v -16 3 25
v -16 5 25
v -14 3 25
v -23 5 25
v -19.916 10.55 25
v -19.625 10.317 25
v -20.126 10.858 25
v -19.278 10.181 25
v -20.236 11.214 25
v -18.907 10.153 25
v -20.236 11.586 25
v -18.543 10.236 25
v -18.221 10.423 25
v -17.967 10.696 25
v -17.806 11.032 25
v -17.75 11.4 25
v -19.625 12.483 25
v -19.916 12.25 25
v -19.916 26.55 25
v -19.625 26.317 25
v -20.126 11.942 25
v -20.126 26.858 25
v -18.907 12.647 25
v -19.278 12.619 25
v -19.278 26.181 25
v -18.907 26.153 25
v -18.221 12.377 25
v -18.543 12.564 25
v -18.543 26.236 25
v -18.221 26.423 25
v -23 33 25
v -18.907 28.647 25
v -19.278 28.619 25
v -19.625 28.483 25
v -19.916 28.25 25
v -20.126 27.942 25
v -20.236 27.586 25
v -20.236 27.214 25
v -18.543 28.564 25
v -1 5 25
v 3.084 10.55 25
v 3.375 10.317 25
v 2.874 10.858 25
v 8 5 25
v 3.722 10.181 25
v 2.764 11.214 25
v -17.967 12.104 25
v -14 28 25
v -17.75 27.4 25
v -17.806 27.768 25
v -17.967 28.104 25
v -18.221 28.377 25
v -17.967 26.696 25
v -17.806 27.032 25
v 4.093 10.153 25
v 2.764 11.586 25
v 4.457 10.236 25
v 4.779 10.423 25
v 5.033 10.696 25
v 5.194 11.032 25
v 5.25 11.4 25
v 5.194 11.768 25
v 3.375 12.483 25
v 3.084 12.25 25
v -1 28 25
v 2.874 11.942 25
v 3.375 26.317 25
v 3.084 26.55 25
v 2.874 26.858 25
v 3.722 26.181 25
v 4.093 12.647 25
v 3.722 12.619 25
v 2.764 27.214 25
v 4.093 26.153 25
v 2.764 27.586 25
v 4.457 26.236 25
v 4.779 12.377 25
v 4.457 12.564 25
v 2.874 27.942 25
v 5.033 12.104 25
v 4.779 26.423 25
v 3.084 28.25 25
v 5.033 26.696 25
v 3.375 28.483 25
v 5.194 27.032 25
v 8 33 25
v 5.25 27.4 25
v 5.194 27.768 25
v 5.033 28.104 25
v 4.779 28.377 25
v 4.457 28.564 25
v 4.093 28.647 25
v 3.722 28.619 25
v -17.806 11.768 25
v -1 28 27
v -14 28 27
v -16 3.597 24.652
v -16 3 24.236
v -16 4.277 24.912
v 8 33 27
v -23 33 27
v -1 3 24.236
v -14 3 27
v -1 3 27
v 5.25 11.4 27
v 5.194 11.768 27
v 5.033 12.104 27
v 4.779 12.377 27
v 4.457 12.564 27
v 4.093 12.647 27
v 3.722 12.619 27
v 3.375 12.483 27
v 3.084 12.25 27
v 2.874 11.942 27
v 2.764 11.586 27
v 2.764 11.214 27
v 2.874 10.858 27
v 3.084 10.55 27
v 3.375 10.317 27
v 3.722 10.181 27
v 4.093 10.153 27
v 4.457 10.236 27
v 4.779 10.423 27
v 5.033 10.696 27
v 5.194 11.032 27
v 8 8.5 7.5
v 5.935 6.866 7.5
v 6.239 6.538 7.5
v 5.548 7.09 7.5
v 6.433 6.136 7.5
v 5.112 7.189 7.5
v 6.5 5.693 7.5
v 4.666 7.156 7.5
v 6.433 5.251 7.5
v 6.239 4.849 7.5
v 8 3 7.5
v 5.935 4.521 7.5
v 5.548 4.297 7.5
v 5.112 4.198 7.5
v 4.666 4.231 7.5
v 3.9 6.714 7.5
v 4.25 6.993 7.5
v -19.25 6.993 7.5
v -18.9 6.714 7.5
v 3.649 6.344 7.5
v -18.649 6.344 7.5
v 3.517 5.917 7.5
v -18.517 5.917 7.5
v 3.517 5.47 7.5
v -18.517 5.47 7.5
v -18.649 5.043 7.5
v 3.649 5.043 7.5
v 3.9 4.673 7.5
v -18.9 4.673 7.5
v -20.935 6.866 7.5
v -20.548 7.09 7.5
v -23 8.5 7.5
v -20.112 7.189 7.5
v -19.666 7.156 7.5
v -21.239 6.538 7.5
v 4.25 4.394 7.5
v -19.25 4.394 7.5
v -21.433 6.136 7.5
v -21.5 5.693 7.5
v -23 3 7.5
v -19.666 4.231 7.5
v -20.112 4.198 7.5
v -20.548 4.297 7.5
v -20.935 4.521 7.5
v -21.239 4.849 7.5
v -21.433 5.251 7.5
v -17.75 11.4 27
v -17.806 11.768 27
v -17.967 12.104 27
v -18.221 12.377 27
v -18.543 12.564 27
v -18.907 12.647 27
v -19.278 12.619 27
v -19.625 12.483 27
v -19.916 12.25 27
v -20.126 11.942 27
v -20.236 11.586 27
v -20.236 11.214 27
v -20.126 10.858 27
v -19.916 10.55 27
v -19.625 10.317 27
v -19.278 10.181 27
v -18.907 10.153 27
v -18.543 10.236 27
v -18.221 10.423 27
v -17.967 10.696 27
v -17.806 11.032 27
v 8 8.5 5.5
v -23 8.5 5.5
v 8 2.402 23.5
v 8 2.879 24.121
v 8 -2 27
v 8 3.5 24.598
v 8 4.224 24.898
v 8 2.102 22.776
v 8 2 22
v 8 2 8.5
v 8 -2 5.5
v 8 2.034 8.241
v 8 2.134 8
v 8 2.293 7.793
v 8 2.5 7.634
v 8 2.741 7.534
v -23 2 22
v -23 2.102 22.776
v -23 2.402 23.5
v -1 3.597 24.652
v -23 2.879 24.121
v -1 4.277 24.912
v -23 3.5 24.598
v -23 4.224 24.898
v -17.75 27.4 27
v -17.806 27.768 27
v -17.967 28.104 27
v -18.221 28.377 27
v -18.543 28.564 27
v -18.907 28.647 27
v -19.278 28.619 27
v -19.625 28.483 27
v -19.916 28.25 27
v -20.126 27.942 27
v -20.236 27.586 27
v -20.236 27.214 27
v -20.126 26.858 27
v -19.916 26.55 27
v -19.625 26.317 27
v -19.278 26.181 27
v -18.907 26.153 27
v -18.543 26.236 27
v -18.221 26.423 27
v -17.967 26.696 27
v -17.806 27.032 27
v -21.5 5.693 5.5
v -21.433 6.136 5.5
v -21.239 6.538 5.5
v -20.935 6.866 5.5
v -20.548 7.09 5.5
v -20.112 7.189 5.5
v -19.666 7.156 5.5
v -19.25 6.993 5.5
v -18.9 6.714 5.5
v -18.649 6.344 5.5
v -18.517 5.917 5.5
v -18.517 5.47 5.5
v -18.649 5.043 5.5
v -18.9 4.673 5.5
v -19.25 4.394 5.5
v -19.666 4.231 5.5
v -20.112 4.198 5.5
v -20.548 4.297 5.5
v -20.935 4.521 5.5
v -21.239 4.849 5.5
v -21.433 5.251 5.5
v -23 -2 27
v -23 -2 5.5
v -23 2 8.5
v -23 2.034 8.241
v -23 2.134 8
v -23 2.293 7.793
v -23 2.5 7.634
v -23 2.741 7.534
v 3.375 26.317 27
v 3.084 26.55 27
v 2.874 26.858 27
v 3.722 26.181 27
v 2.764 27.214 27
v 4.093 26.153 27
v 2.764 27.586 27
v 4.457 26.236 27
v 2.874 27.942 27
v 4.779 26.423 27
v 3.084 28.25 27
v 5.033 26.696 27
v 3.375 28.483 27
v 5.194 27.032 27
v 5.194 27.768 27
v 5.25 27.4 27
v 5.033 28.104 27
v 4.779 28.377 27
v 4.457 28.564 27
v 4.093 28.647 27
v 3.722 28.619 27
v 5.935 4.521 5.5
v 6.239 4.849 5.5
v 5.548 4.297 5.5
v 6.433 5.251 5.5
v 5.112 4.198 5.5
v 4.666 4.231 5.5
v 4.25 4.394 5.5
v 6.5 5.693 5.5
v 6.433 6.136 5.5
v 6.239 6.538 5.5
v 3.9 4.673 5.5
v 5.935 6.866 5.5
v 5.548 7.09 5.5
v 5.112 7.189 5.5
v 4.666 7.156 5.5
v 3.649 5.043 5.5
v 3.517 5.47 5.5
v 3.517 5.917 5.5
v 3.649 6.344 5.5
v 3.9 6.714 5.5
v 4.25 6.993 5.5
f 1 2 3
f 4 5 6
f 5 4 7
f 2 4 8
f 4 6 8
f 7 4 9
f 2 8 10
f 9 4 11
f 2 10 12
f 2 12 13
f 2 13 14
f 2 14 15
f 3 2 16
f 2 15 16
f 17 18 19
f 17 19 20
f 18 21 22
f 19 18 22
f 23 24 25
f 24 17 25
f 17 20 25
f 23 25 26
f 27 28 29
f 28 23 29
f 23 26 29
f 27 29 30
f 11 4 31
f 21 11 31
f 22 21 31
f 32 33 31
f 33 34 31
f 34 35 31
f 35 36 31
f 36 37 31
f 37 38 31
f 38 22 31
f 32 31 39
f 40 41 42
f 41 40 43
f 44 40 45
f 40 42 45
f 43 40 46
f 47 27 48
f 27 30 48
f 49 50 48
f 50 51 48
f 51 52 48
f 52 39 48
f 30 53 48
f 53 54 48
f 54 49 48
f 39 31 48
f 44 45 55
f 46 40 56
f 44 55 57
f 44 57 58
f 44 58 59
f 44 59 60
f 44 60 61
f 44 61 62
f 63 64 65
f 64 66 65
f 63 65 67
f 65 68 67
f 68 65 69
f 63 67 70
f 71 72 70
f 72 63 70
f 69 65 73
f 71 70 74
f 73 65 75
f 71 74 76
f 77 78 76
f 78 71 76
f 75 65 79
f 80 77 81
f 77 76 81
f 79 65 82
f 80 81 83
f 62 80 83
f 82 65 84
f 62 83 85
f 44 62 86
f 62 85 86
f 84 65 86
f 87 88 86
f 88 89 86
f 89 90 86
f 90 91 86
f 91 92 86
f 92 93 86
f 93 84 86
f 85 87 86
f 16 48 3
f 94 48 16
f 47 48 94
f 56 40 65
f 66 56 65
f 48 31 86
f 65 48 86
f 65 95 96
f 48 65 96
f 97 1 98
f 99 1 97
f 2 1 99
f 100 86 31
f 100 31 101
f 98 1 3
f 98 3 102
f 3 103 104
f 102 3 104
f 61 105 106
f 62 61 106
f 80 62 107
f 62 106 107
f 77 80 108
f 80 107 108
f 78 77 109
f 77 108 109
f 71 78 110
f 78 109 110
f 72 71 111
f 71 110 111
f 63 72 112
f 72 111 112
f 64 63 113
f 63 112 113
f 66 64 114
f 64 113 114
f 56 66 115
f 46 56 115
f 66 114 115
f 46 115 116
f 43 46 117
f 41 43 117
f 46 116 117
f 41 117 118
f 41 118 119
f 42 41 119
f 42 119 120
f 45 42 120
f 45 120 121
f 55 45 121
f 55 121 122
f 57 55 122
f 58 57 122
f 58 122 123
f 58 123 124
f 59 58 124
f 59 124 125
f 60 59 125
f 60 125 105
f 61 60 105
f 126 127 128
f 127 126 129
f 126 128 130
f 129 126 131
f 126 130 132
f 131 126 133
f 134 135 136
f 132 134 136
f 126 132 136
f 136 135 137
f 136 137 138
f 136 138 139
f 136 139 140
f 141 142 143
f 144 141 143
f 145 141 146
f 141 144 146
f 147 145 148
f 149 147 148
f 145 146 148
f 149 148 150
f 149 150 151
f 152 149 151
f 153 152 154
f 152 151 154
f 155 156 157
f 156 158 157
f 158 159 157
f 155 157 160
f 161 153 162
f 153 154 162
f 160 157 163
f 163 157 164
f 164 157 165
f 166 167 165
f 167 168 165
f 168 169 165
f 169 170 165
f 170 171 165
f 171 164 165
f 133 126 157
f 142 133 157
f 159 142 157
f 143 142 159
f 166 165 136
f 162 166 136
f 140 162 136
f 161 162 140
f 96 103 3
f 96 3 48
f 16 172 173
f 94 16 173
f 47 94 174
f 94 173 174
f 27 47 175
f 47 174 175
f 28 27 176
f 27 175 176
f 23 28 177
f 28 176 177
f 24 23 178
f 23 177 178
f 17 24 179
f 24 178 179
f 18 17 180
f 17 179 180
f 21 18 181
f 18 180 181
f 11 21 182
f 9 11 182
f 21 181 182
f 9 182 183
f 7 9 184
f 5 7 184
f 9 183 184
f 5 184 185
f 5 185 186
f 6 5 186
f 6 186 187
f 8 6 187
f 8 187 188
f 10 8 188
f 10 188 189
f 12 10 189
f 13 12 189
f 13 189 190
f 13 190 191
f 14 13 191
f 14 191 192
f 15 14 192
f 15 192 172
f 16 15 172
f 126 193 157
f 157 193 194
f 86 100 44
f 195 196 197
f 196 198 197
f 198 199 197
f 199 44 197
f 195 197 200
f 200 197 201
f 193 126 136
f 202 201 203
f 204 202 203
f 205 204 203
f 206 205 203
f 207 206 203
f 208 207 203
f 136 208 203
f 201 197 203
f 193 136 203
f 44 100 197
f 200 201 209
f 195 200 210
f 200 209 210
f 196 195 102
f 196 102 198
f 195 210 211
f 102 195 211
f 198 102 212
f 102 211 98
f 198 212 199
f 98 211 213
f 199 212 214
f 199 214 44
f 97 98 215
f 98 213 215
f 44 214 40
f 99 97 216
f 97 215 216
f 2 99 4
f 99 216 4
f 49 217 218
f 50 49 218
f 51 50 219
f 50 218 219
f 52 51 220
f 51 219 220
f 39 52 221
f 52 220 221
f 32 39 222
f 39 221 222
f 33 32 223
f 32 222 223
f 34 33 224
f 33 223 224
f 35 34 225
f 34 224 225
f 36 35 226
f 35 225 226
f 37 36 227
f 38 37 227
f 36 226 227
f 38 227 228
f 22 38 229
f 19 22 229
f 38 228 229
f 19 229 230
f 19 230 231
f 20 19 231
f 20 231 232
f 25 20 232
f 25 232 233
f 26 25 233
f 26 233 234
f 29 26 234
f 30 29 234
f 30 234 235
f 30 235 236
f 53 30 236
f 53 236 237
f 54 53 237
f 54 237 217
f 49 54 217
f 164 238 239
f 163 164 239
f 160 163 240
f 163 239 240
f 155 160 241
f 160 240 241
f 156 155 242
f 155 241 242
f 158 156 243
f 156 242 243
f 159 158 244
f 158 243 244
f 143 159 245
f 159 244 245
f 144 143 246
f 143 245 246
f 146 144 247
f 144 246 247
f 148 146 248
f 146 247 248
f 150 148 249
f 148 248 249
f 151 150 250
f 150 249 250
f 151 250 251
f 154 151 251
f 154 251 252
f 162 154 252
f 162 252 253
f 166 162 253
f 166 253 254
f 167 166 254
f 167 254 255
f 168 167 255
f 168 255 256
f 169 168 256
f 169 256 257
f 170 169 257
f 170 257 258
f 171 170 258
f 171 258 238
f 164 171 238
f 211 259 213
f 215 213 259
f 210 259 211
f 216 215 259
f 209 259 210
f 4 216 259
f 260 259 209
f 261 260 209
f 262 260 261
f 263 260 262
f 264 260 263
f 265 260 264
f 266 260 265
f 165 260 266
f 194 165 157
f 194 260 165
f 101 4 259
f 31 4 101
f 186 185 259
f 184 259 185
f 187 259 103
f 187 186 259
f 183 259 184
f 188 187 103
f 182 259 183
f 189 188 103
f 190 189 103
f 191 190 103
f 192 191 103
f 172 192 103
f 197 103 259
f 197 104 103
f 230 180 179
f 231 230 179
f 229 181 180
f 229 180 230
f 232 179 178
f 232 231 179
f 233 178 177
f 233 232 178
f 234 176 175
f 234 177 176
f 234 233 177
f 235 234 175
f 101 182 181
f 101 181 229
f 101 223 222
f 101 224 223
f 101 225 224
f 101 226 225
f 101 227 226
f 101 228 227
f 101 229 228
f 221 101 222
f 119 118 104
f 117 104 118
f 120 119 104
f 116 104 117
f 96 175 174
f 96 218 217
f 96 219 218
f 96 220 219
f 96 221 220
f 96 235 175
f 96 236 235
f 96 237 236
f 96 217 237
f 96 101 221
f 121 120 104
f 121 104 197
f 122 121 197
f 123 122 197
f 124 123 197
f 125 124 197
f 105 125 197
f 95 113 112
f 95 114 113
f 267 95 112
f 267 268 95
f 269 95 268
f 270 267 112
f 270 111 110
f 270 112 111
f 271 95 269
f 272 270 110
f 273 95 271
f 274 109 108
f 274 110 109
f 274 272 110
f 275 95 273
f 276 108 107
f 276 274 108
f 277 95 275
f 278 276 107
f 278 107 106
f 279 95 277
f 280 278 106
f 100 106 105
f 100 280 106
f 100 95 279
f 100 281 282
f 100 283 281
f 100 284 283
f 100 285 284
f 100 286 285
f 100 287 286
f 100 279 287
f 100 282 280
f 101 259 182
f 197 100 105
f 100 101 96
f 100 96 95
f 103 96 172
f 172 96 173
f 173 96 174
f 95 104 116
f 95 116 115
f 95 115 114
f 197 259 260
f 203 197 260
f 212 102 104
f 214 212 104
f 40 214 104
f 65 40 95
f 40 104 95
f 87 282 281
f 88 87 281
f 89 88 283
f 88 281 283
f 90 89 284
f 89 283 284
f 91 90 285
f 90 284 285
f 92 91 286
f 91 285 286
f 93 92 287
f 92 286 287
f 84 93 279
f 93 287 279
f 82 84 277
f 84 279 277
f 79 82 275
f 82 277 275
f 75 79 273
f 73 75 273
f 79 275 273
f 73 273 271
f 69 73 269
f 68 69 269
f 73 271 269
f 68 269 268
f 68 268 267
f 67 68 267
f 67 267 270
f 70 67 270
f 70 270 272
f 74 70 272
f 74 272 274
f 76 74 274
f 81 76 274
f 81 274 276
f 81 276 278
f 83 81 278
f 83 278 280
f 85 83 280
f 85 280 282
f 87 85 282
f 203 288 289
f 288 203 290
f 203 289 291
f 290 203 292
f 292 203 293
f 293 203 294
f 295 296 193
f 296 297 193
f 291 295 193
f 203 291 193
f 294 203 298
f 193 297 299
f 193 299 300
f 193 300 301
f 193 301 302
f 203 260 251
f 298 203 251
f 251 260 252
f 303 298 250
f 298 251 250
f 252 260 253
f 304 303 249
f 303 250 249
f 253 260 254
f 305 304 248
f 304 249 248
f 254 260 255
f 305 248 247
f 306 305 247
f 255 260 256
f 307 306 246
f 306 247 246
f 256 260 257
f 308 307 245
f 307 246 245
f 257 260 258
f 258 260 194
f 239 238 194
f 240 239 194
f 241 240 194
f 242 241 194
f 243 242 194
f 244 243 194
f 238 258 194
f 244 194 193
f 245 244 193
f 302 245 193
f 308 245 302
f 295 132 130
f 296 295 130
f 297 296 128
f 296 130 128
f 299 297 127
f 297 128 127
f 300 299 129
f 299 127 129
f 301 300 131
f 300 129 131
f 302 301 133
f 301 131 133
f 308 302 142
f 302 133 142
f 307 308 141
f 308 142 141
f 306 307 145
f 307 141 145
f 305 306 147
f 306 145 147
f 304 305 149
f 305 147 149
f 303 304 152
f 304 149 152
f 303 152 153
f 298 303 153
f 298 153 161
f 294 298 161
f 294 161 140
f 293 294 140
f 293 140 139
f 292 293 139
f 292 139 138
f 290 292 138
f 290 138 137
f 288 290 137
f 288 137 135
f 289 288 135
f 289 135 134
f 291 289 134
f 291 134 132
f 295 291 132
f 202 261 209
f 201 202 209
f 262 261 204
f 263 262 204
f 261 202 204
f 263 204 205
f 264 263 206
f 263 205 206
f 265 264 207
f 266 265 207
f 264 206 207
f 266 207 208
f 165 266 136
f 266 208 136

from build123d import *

# Parameters (mm, degrees)
SKETCH1_W           = 16
SKETCH1_H           = 4
BOSS_EXTRUDE1_DEPTH = 25
SKETCH2_W           = 16
SKETCH2_H           = 35
BOSS_EXTRUDE2_DEPTH = 2
FILLET1_R           = 3
SKETCH9_W           = 16
SKETCH9_H           = 5.5
CUT_EXTRUDE6_DEPTH  = 10
SKETCH10_W          = 16
SKETCH10_H          = 2
BOSS_EXTRUDE4_DEPTH = 8
SKETCH12_R          = 1.5
CUT_EXTRUDE7_DEPTH  = 10
SKETCH13_R          = 1
CUT_EXTRUDE8_DEPTH  = 10
BOSS_EXTRUDE5_START = 17
BOSS_EXTRUDE5_DEPTH = 17
SKETCH15_W          = 33
SKETCH15_H          = 1.5
CUT_EXTRUDE9_DEPTH  = 10
SKETCH17_W          = 7.5
SKETCH17_H          = 25
CUT_EXTRUDE11_DEPTH = 10
SKETCH18_R          = 1.1
CUT_EXTRUDE12_DEPTH = 27
SKETCH19_W          = 2
SKETCH19_H          = 35
CUT_EXTRUDE13_DEPTH = 27
SKETCH21_W          = 2
SKETCH21_H          = 25
BOSS_EXTRUDE6_DEPTH = 2
SKETCH22_R          = 1.5
CUT_EXTRUDE14_DEPTH = 11
FILLET2_R           = 1
SKETCH23_R          = 1.25
CUT_EXTRUDE15_DEPTH = 10


with BuildPart() as part:
    # Sketch1 → Boss-Extrude1 (new body)
    with BuildSketch(Plane.XY):
        Rectangle(SKETCH1_W, SKETCH1_H)
    extrude(amount=BOSS_EXTRUDE1_DEPTH)

    # Sketch2 → Boss-Extrude2 (add)
    with BuildSketch(Plane.XY.offset(25)):
        with Locations((0, 15.5)):
            Rectangle(SKETCH2_W, SKETCH2_H)
    extrude(amount=BOSS_EXTRUDE2_DEPTH)

    # Fillet1
    fillet1_edges = [part.edges().sort_by_distance(p)[0] for p in [
        (0, 2, 25),
    ]]
    fillet(fillet1_edges, radius=FILLET1_R)

    # Sketch9 → Cut-Extrude6 (cut)
    with BuildSketch(Plane(origin=(0, 2, 0), x_dir=(1, 0, 0), z_dir=(0, 1, 0))):
        with Locations((0, -2.75)):
            Rectangle(SKETCH9_W, SKETCH9_H)
    extrude(amount=-CUT_EXTRUDE6_DEPTH, mode=Mode.SUBTRACT)

    # Sketch10 → Boss-Extrude4 (add)
    with BuildSketch(Plane(origin=(0, 2, 0), x_dir=(1, 0, 0), z_dir=(0, 1, 0))):
        with Locations((0, -6.5)):
            Rectangle(SKETCH10_W, SKETCH10_H)
    extrude(amount=BOSS_EXTRUDE4_DEPTH)

    # Sketch12 → Cut-Extrude7 (cut)
    with BuildSketch(Plane.XY.offset(7.5)):
        with Locations((5, 5.69348198)):
            Circle(SKETCH12_R)
    extrude(amount=-CUT_EXTRUDE7_DEPTH, mode=Mode.SUBTRACT)

    # Sketch13 → Cut-Extrude8 (cut)
    with BuildSketch(Plane.XY.offset(27)):
        with Locations((4, 27.4)):
            Circle(SKETCH13_R)
        with Locations((4, 11.4)):
            Circle(SKETCH13_R)
    extrude(amount=-CUT_EXTRUDE8_DEPTH, mode=Mode.SUBTRACT)

    # Sketch14 → Boss-Extrude5 (add)
    with BuildSketch(Plane.ZY.offset(8).offset(BOSS_EXTRUDE5_START)):
        with BuildLine():
            Line((5.5, 10), (7.5, 10))
            Line((7.5, 10), (7.5, 2))
            Line((7.5, 2), (22, 2))
            ThreePointArc((22, 2), (24.121320344, 2.878679656), (25, 5))
            Line((25, 5), (25, 33))
            Line((25, 33), (27, 33))
            Line((27, 33), (27, -2))
            Line((27, -2), (5.5, -2))
            Line((5.5, -2), (5.5, 10))
        make_face()
    extrude(amount=-BOSS_EXTRUDE5_DEPTH)

    # Sketch15 → Cut-Extrude9 (cut)
    with BuildSketch(Plane(origin=(0, 0, 5.5), x_dir=(-1, 0, 0), z_dir=(0, 0, -1))):
        with Locations((8.5, 9.25)):
            Rectangle(SKETCH15_W, SKETCH15_H)
    extrude(amount=-CUT_EXTRUDE9_DEPTH, mode=Mode.SUBTRACT)

    # Sketch17 → Cut-Extrude11 (cut)
    with BuildSketch(Plane.XY.offset(27)):
        with Locations((-12.25, 15.5)):
            Rectangle(SKETCH17_W, SKETCH17_H)
        with Locations((-4.75, 15.5)):
            Rectangle(SKETCH17_W, SKETCH17_H)
    extrude(amount=-CUT_EXTRUDE11_DEPTH, mode=Mode.SUBTRACT)

    # Sketch18 → Cut-Extrude12 (cut)
    with BuildSketch(Plane(origin=(0, 0, 25), x_dir=(-1, 0, 0), z_dir=(0, 0, -1))):
        with Locations((19, 11.4)):
            Circle(SKETCH18_R)
        with Locations((19, 27.4)):
            Circle(SKETCH18_R)
        with Locations((-4, 27.4)):
            Circle(SKETCH18_R)
        with Locations((-4, 11.4)):
            Circle(SKETCH18_R)
    extrude(amount=-CUT_EXTRUDE12_DEPTH, mode=Mode.SUBTRACT)

    # Sketch19 → Cut-Extrude13 (cut)
    with BuildSketch(Plane(origin=(0, 0, 5.5), x_dir=(-1, 0, 0), z_dir=(0, 0, -1))):
        with Locations((24, 15.5)):
            Rectangle(SKETCH19_W, SKETCH19_H)
    extrude(amount=-CUT_EXTRUDE13_DEPTH, mode=Mode.SUBTRACT)

    # Sketch21 → Boss-Extrude6 (add)
    with BuildSketch(Plane.XY.offset(27)):
        with Locations((-15, 15.5)):
            Rectangle(SKETCH21_W, SKETCH21_H)
    extrude(amount=-BOSS_EXTRUDE6_DEPTH)

    # Sketch22 → Cut-Extrude14 (cut)
    with BuildSketch(Plane(origin=(0, 0, 5.5), x_dir=(-1, 0, 0), z_dir=(0, 0, -1))):
        with Locations((20, 5.69348198)):
            Circle(SKETCH22_R)
    extrude(amount=-CUT_EXTRUDE14_DEPTH, mode=Mode.SUBTRACT)

    # Fillet2
    fillet2_edges = [part.edges().sort_by_distance(p)[0] for p in [
        (-7.5, 2, 7.5),
    ]]
    fillet(fillet2_edges, radius=FILLET2_R)

    # Sketch23 → Cut-Extrude15 (cut)
    with BuildSketch(Plane.XY.offset(27)):
        with Locations((4, 27.4)):
            Circle(SKETCH23_R)
        with Locations((4, 11.4)):
            Circle(SKETCH23_R)
        with Locations((-19, 11.4)):
            Circle(SKETCH23_R)
        with Locations((-19, 27.4)):
            Circle(SKETCH23_R)
    extrude(amount=-CUT_EXTRUDE15_DEPTH, mode=Mode.SUBTRACT)


solid = part.part
